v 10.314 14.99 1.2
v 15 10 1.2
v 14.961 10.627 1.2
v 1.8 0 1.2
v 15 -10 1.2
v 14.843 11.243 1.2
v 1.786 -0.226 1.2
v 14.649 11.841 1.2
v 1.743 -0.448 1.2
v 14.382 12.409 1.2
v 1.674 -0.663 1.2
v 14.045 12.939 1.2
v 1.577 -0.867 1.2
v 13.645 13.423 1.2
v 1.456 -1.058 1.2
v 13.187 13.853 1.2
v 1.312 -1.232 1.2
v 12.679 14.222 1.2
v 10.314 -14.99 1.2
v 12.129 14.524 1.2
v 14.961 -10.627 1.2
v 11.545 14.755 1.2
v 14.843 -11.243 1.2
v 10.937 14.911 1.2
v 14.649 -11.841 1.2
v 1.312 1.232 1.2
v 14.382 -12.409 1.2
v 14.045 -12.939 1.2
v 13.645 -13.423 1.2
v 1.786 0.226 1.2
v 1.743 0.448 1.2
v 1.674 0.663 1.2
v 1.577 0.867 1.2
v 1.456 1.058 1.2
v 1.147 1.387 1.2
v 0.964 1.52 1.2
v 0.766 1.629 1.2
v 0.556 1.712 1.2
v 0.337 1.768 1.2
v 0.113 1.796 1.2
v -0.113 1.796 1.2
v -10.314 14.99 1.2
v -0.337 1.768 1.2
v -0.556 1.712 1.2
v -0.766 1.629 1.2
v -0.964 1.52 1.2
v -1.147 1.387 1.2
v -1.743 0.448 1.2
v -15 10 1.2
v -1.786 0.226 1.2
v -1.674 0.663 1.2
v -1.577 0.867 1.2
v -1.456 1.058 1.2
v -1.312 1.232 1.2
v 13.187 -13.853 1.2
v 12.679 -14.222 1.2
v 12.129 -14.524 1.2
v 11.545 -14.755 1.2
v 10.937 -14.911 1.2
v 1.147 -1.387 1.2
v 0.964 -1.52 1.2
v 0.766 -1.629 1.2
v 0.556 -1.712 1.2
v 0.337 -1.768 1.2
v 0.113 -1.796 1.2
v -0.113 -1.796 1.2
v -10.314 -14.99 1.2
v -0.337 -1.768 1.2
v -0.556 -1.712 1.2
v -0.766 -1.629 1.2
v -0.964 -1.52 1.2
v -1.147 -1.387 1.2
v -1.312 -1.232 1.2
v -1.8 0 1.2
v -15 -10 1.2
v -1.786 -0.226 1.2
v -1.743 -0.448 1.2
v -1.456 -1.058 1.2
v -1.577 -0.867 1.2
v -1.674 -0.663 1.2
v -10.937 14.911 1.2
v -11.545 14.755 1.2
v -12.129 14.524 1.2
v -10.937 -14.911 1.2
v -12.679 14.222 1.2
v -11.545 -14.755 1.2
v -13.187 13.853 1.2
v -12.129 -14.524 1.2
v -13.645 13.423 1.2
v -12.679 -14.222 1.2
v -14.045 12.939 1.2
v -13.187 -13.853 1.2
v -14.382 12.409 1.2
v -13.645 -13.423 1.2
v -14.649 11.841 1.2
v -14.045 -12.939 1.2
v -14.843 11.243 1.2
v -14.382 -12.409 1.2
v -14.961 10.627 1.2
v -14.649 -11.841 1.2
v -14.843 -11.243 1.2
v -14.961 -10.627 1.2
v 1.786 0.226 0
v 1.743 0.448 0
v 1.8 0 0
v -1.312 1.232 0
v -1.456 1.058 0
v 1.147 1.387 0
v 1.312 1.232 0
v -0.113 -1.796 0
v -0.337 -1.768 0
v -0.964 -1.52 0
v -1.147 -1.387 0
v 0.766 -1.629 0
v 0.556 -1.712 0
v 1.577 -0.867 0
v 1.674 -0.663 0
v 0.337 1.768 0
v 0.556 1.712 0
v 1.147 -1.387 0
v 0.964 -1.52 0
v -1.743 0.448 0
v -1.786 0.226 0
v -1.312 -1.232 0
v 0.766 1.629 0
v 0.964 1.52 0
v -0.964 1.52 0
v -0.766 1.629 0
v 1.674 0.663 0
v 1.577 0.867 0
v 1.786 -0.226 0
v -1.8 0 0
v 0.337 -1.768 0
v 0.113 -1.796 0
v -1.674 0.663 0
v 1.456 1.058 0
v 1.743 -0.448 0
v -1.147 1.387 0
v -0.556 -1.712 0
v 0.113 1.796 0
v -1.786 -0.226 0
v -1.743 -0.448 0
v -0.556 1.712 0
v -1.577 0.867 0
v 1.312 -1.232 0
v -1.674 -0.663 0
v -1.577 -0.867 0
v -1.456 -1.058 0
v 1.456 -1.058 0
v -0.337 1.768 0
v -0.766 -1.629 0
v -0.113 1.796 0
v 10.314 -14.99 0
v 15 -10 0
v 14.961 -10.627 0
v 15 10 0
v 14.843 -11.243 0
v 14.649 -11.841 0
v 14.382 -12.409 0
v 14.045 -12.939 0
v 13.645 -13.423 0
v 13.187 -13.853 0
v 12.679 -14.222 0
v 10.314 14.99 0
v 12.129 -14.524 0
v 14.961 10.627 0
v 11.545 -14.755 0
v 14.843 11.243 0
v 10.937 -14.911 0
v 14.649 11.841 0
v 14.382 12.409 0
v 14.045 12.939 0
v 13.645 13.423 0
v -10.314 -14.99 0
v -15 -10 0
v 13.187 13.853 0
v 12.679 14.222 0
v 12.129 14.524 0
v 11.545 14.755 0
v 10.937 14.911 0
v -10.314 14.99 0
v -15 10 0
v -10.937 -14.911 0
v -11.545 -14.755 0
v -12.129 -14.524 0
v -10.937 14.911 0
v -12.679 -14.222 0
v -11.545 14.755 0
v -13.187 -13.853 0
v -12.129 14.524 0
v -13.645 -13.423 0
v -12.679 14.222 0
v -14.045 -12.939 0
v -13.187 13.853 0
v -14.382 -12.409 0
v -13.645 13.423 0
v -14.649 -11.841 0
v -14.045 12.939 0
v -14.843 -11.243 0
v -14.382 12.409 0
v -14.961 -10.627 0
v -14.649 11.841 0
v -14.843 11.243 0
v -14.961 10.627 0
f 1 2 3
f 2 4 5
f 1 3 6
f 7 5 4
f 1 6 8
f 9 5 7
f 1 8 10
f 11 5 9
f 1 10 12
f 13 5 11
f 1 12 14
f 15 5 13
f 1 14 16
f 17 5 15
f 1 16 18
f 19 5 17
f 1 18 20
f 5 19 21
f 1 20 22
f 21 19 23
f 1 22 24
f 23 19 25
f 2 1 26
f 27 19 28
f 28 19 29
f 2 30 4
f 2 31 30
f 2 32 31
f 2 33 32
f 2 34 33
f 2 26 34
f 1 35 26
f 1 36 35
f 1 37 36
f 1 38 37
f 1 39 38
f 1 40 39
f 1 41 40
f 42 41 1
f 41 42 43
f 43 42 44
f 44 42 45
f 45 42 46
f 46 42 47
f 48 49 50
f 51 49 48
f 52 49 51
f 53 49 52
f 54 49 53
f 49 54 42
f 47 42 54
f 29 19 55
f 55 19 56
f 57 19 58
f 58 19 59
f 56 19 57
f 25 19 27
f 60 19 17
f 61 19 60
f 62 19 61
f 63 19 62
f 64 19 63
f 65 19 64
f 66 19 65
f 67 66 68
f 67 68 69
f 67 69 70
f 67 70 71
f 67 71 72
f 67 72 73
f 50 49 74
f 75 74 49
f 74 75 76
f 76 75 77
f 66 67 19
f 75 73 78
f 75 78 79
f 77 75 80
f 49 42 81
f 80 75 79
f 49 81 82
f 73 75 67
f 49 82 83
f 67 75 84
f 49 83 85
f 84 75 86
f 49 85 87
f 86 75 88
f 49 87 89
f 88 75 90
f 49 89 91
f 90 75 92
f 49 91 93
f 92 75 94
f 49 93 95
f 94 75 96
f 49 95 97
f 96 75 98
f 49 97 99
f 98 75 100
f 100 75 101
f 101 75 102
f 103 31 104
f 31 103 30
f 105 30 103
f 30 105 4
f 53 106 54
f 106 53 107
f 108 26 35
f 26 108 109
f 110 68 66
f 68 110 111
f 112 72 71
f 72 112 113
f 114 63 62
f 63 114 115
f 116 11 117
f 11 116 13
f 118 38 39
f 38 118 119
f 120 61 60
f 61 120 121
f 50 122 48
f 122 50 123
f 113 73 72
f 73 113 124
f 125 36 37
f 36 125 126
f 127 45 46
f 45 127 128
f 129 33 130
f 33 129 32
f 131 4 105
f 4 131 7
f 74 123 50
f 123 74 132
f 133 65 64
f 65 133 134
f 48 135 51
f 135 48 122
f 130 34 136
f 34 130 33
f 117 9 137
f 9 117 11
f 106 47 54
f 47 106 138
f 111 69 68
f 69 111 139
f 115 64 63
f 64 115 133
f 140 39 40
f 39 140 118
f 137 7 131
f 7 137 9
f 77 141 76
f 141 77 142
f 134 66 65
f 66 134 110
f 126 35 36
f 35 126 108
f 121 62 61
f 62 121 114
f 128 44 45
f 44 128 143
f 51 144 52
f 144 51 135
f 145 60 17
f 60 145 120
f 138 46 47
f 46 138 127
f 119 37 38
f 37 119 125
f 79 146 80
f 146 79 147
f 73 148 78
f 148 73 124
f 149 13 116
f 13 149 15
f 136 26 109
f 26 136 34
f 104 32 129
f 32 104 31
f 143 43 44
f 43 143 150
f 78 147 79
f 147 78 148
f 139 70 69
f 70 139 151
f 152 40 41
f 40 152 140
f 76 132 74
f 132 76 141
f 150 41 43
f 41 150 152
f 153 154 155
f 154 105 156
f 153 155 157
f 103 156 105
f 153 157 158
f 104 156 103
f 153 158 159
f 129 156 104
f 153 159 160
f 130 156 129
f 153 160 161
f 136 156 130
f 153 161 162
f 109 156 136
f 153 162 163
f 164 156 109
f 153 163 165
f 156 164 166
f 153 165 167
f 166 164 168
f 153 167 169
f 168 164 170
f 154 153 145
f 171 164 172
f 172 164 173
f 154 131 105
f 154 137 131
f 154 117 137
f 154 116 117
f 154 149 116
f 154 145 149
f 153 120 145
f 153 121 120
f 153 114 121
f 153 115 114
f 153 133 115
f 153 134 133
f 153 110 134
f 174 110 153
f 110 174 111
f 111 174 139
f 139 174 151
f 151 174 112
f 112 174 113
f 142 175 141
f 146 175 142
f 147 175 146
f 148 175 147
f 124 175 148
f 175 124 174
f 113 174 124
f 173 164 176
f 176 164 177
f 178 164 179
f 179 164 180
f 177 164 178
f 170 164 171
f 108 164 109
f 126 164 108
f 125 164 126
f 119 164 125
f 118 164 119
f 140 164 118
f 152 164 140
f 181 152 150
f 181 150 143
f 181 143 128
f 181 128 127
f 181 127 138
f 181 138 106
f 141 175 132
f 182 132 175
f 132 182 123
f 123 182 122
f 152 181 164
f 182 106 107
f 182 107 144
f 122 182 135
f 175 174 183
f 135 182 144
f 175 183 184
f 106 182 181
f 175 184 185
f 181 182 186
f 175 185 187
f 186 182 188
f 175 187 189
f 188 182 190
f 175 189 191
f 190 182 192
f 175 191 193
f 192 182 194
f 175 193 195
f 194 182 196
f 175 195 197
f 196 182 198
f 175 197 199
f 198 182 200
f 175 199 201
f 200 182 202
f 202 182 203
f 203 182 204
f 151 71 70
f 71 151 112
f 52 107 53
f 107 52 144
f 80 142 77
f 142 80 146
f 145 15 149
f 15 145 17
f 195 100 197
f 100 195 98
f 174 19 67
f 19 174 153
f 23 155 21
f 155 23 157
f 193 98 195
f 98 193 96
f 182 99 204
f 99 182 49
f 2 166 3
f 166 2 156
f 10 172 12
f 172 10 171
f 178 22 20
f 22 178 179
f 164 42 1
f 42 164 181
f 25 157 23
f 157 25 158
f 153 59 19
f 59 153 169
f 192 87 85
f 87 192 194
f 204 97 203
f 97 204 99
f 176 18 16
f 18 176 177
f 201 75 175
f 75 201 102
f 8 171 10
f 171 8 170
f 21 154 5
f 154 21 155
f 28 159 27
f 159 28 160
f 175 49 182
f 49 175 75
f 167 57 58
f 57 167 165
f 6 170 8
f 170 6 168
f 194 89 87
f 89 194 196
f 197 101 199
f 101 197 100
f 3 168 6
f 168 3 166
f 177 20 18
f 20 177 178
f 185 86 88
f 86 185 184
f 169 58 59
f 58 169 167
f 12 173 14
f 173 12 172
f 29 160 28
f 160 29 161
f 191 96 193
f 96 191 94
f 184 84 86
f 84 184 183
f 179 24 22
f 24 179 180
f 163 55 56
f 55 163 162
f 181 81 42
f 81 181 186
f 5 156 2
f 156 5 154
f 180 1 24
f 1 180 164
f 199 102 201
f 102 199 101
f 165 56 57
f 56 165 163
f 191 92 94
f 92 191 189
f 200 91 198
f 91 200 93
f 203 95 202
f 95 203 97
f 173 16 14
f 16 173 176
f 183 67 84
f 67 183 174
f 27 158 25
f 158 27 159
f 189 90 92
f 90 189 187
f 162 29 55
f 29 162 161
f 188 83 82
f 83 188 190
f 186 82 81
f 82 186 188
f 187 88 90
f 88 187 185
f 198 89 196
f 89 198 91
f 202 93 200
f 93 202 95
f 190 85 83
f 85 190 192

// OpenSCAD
$fn = 50;


difference() {
	union() {
		hull() {
			translate(v = [-10.0000000000, 10.0000000000, 0]) {
				cylinder(h = 99, r = 5);
			}
			translate(v = [10.0000000000, 10.0000000000, 0]) {
				cylinder(h = 99, r = 5);
			}
			translate(v = [-10.0000000000, -10.0000000000, 0]) {
				cylinder(h = 99, r = 5);
			}
			translate(v = [10.0000000000, -10.0000000000, 0]) {
				cylinder(h = 99, r = 5);
			}
		}
	}
	union() {
		translate(v = [0, 0, 1.2000000000]) {
			hull() {
				translate(v = [-10.0000000000, 10.0000000000, 0]) {
					cylinder(h = 97.8000000000, r = 3.8000000000);
				}
				translate(v = [10.0000000000, 10.0000000000, 0]) {
					cylinder(h = 97.8000000000, r = 3.8000000000);
				}
				translate(v = [-10.0000000000, -10.0000000000, 0]) {
					cylinder(h = 97.8000000000, r = 3.8000000000);
				}
				translate(v = [10.0000000000, -10.0000000000, 0]) {
					cylinder(h = 97.8000000000, r = 3.8000000000);
				}
			}
		}
		#cylinder(h = 1.2000000000, r = 1.8000000000);
		translate(v = [-250.0000000000, -250.0000000000, 1.2000000000]) {
			cube(size = [500, 500, 500]);
		}
		translate(v = [-250.0000000000, -250.0000000000, 1.2000000000]) {
			cube(size = [500, 500, 500]);
		}
		translate(v = [-250.0000000000, -250.0000000000, 1.2000000000]) {
			cube(size = [500, 500, 500]);
		}
	}
}
